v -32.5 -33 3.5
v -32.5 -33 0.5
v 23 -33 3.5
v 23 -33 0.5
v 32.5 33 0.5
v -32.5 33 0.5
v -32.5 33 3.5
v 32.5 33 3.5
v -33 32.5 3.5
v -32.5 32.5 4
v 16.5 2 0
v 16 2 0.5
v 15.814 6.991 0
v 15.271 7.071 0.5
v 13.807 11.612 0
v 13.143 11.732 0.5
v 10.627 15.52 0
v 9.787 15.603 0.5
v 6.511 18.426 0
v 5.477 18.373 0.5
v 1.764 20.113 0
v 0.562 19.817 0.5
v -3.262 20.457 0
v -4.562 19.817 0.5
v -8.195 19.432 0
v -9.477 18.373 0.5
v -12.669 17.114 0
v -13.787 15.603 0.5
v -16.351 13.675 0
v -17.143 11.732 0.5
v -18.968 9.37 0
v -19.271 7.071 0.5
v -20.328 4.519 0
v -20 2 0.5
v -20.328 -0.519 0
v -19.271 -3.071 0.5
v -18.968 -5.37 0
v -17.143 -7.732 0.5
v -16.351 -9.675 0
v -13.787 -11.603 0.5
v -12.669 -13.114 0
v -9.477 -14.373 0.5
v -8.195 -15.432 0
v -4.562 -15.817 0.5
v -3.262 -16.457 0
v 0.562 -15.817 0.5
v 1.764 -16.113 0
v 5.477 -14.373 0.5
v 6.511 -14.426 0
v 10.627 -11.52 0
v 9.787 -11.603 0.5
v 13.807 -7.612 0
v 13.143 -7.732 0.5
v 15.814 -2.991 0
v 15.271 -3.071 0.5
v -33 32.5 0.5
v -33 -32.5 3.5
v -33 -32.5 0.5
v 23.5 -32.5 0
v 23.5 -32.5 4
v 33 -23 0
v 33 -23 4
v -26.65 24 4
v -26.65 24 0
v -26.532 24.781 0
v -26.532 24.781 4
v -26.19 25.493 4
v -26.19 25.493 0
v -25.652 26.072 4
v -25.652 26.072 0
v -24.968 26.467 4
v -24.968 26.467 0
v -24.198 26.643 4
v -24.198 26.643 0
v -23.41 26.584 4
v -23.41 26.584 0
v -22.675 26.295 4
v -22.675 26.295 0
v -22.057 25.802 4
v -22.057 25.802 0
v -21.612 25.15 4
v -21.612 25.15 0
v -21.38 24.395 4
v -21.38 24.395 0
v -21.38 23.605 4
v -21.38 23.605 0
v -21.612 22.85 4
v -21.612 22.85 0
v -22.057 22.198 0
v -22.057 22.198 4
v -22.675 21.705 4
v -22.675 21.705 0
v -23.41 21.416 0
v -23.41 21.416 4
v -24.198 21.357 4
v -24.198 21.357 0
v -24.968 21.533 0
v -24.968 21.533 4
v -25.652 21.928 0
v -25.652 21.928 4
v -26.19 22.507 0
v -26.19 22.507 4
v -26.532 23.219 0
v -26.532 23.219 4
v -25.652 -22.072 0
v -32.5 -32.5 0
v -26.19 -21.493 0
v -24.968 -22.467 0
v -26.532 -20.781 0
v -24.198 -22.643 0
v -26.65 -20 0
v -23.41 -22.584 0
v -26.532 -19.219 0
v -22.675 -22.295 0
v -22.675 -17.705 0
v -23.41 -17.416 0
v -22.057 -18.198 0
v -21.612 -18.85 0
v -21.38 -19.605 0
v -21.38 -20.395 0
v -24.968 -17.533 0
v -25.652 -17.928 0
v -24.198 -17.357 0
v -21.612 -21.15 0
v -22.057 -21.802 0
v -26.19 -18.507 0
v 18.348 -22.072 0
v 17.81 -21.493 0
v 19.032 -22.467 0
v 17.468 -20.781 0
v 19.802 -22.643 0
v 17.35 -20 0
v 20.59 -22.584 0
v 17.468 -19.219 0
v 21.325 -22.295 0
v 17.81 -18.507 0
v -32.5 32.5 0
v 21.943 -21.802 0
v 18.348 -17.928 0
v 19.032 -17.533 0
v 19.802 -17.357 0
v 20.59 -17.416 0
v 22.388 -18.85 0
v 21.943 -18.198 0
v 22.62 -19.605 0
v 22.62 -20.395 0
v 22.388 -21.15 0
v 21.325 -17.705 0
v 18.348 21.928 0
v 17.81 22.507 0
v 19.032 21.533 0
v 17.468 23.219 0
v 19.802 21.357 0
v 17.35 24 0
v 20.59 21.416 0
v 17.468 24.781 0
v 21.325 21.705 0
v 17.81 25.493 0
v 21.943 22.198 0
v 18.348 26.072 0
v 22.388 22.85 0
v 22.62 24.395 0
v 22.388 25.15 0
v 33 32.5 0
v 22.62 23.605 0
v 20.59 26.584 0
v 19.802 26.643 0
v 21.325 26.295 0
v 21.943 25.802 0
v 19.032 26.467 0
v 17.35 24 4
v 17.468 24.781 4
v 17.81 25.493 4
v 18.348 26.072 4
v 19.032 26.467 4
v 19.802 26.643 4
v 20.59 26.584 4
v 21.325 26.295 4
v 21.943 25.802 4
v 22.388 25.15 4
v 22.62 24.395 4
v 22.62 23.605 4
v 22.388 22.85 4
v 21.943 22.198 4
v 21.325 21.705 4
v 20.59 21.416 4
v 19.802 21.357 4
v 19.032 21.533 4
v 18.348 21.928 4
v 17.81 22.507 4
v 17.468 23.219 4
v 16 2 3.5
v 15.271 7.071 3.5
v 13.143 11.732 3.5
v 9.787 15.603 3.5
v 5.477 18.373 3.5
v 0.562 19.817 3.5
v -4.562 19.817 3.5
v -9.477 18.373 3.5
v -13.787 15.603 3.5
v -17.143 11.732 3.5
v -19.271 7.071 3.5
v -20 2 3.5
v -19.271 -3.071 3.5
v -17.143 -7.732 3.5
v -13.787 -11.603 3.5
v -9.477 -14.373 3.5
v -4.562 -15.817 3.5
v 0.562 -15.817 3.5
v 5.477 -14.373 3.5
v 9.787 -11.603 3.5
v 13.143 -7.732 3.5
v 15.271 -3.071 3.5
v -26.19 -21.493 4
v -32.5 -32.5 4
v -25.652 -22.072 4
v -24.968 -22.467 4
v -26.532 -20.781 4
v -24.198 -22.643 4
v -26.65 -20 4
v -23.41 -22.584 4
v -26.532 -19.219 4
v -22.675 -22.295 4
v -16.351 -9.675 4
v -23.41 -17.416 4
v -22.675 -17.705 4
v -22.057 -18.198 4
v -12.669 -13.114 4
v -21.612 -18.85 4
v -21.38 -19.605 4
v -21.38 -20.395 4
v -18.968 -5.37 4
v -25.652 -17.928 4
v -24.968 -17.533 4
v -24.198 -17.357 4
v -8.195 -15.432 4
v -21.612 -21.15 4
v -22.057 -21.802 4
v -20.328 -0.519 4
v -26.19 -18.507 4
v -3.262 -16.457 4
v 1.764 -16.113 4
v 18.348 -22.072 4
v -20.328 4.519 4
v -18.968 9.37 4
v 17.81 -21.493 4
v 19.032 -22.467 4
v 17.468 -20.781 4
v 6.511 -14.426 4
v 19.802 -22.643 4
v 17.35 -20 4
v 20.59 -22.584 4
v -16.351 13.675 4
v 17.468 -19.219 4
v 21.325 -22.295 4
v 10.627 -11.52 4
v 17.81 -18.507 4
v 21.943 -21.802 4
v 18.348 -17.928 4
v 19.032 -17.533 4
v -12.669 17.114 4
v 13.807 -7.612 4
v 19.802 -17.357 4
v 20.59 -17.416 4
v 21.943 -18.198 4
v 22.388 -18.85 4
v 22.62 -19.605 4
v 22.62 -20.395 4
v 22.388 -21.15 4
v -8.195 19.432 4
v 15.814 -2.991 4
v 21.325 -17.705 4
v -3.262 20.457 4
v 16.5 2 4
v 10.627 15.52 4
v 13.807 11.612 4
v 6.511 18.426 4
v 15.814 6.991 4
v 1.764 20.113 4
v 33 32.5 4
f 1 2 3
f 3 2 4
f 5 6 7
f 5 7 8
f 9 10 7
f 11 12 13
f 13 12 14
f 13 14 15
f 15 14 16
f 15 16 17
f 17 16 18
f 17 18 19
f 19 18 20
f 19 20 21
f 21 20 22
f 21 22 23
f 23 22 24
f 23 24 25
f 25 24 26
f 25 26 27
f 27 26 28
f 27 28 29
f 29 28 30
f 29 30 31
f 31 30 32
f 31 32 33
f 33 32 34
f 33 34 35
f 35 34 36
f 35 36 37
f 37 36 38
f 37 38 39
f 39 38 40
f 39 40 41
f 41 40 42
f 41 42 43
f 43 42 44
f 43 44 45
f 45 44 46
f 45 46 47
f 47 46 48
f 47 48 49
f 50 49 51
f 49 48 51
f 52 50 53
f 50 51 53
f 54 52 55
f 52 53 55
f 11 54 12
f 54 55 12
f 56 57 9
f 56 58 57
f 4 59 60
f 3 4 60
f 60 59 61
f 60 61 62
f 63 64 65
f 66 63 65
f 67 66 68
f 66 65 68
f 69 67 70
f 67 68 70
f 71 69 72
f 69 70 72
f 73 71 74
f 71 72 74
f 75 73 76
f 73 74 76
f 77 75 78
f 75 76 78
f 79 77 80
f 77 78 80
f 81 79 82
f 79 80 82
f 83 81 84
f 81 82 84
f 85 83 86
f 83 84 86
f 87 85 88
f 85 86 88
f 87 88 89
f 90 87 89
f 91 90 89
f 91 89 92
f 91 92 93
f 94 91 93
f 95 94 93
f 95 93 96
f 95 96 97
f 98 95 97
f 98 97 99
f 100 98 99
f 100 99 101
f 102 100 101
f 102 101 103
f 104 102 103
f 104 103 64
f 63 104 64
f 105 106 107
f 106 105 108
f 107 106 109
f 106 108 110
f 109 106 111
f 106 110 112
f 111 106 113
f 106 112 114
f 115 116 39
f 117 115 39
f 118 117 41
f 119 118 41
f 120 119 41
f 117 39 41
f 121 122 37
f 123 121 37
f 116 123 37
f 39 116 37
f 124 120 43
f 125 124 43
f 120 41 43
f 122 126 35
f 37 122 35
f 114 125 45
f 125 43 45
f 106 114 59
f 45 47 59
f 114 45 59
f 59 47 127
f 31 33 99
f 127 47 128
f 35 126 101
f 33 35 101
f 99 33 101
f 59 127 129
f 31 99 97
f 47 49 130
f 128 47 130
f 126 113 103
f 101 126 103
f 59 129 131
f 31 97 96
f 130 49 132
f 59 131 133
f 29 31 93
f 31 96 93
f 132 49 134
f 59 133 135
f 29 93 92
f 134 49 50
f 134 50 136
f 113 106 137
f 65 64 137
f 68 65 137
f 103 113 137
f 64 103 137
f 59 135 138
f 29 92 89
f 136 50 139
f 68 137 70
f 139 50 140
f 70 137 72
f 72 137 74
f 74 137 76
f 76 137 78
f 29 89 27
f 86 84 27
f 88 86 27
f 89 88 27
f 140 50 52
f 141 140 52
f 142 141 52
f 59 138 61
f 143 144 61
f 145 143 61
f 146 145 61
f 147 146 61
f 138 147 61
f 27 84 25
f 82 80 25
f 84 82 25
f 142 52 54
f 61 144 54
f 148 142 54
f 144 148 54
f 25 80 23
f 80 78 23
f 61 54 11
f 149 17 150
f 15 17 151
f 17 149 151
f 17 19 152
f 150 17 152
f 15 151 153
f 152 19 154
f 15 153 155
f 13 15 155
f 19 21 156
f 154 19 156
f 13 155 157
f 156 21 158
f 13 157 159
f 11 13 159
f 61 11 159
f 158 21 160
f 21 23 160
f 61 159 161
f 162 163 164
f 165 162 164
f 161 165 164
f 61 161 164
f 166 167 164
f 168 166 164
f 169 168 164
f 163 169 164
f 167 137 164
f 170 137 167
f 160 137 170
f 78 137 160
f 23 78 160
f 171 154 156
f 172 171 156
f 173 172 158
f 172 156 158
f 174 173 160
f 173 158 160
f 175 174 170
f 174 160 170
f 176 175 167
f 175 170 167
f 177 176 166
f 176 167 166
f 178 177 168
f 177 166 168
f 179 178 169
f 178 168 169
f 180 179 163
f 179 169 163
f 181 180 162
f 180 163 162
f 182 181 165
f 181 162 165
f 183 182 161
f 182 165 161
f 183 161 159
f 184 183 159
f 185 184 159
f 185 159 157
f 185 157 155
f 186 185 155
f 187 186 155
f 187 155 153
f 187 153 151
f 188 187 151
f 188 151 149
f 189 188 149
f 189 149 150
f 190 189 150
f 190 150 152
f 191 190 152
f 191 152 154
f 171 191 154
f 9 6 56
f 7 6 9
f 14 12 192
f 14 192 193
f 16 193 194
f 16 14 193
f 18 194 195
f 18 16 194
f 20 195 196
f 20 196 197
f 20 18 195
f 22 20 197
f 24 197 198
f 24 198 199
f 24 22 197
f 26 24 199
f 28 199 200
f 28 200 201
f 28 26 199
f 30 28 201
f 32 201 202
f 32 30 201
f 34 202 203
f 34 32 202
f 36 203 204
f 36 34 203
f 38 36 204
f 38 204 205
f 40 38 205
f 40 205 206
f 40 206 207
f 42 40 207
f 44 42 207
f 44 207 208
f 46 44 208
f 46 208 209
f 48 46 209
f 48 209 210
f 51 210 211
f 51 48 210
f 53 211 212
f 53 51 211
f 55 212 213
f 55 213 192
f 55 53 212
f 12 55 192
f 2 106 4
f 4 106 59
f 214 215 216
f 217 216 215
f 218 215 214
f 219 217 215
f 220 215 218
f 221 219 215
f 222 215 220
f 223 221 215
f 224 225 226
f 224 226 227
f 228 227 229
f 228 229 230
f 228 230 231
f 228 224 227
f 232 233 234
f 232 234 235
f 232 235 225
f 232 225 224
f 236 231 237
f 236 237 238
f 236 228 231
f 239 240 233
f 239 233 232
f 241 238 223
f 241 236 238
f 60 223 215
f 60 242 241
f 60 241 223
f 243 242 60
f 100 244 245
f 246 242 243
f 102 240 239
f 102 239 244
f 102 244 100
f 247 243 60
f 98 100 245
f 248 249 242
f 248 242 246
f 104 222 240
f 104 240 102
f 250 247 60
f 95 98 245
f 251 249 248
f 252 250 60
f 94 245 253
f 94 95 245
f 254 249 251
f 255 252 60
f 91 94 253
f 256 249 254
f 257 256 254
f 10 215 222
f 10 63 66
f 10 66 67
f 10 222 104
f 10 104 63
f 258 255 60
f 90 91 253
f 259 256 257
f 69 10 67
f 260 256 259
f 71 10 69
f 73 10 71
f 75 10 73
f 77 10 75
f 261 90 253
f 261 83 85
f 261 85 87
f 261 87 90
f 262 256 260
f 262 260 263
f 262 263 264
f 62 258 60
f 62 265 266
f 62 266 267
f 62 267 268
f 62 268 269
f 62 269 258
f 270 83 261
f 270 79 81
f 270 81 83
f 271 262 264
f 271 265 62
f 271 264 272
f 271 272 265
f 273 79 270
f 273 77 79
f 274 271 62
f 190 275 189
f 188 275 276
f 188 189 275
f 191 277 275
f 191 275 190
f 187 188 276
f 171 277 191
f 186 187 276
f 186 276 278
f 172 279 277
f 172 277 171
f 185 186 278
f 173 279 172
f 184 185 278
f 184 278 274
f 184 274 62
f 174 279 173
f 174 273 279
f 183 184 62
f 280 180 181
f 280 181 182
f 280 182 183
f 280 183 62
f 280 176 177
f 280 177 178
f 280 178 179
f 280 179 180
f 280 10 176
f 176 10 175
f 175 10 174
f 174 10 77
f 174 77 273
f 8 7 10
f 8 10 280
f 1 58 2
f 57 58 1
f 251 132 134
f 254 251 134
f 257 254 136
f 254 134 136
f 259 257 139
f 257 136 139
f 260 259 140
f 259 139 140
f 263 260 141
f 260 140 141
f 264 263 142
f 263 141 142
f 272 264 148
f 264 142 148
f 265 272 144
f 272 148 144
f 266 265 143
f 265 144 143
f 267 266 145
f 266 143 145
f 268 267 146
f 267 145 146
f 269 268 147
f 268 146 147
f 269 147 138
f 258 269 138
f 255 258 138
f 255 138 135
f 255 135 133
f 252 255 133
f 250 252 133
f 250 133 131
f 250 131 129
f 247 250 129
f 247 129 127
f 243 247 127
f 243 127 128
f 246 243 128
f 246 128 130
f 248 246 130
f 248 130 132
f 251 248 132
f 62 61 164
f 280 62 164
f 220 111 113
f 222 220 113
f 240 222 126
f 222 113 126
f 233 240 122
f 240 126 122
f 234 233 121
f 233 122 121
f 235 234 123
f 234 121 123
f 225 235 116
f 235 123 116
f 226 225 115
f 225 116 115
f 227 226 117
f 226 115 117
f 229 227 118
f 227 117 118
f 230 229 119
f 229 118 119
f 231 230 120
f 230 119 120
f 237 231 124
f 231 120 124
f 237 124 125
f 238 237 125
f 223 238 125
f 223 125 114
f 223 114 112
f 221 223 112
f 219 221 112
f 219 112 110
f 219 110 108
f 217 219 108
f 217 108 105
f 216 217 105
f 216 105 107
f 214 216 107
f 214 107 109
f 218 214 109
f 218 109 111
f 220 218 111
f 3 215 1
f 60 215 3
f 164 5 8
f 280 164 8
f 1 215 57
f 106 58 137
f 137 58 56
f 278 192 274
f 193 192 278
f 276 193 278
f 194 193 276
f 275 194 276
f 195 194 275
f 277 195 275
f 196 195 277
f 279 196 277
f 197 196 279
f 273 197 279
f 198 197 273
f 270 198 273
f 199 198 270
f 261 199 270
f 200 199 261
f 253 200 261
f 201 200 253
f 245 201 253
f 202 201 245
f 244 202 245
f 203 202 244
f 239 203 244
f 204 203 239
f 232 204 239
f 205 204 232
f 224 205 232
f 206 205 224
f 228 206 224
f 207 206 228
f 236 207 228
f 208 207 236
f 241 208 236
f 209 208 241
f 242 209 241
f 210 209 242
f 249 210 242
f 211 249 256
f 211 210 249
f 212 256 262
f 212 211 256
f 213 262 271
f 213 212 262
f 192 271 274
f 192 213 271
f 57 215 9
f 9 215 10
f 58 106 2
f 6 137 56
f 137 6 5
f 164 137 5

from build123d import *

# Parameters (mm, degrees)
ESQUISSE1_W        = 66
ESQUISSE1_H        = 66
ESQUISSE1_R        = 18
BOSS_EXTRU_1_DEPTH = 4
CHANFREIN1_SIZE    = 10
CHANFREIN2_SIZE    = 0.5
D_GAGEMENT_M51_D   = 5.3


with BuildPart() as part:
    # Esquisse1 → Boss.-Extru.1 (new body)
    with BuildSketch(Plane.XY):
        Rectangle(ESQUISSE1_W, ESQUISSE1_H)
        with Locations((-2, 2)):
            Circle(ESQUISSE1_R, mode=Mode.SUBTRACT)
    extrude(amount=BOSS_EXTRU_1_DEPTH)

    # Chanfrein1
    chanfrein1_edges = [part.edges().sort_by_distance(p)[0] for p in [
        (33, -33, 2),
    ]]
    chamfer(chanfrein1_edges, length=CHANFREIN1_SIZE)

    # Chanfrein2
    chanfrein2_edges = [part.edges().sort_by_distance(p)[0] for p in [
        (-33, 0, 4),
        (-20, 2, 0),
        (-20, 2, 4),
        (-5, -33, 4),
        (-5, -33, 0),
        (-33, 0, 0),
        (0, 33, 0),
        (0, 33, 4),
        (-33, -33, 2),
        (-33, 33, 2),
        (33, 33, 2),
    ]]
    chamfer(chanfrein2_edges, length=CHANFREIN2_SIZE)

    # Dégagement M51 (through all)
    with Locations(Plane.XY.offset(4)):
        with Locations((-24, 24), (20, 24), (20, -20), (-24, -20), (-162.098619818, 40.106243937), (-166.138996893, 40.106243937)):
            Hole(D_GAGEMENT_M51_D / 2)


solid = part.part
